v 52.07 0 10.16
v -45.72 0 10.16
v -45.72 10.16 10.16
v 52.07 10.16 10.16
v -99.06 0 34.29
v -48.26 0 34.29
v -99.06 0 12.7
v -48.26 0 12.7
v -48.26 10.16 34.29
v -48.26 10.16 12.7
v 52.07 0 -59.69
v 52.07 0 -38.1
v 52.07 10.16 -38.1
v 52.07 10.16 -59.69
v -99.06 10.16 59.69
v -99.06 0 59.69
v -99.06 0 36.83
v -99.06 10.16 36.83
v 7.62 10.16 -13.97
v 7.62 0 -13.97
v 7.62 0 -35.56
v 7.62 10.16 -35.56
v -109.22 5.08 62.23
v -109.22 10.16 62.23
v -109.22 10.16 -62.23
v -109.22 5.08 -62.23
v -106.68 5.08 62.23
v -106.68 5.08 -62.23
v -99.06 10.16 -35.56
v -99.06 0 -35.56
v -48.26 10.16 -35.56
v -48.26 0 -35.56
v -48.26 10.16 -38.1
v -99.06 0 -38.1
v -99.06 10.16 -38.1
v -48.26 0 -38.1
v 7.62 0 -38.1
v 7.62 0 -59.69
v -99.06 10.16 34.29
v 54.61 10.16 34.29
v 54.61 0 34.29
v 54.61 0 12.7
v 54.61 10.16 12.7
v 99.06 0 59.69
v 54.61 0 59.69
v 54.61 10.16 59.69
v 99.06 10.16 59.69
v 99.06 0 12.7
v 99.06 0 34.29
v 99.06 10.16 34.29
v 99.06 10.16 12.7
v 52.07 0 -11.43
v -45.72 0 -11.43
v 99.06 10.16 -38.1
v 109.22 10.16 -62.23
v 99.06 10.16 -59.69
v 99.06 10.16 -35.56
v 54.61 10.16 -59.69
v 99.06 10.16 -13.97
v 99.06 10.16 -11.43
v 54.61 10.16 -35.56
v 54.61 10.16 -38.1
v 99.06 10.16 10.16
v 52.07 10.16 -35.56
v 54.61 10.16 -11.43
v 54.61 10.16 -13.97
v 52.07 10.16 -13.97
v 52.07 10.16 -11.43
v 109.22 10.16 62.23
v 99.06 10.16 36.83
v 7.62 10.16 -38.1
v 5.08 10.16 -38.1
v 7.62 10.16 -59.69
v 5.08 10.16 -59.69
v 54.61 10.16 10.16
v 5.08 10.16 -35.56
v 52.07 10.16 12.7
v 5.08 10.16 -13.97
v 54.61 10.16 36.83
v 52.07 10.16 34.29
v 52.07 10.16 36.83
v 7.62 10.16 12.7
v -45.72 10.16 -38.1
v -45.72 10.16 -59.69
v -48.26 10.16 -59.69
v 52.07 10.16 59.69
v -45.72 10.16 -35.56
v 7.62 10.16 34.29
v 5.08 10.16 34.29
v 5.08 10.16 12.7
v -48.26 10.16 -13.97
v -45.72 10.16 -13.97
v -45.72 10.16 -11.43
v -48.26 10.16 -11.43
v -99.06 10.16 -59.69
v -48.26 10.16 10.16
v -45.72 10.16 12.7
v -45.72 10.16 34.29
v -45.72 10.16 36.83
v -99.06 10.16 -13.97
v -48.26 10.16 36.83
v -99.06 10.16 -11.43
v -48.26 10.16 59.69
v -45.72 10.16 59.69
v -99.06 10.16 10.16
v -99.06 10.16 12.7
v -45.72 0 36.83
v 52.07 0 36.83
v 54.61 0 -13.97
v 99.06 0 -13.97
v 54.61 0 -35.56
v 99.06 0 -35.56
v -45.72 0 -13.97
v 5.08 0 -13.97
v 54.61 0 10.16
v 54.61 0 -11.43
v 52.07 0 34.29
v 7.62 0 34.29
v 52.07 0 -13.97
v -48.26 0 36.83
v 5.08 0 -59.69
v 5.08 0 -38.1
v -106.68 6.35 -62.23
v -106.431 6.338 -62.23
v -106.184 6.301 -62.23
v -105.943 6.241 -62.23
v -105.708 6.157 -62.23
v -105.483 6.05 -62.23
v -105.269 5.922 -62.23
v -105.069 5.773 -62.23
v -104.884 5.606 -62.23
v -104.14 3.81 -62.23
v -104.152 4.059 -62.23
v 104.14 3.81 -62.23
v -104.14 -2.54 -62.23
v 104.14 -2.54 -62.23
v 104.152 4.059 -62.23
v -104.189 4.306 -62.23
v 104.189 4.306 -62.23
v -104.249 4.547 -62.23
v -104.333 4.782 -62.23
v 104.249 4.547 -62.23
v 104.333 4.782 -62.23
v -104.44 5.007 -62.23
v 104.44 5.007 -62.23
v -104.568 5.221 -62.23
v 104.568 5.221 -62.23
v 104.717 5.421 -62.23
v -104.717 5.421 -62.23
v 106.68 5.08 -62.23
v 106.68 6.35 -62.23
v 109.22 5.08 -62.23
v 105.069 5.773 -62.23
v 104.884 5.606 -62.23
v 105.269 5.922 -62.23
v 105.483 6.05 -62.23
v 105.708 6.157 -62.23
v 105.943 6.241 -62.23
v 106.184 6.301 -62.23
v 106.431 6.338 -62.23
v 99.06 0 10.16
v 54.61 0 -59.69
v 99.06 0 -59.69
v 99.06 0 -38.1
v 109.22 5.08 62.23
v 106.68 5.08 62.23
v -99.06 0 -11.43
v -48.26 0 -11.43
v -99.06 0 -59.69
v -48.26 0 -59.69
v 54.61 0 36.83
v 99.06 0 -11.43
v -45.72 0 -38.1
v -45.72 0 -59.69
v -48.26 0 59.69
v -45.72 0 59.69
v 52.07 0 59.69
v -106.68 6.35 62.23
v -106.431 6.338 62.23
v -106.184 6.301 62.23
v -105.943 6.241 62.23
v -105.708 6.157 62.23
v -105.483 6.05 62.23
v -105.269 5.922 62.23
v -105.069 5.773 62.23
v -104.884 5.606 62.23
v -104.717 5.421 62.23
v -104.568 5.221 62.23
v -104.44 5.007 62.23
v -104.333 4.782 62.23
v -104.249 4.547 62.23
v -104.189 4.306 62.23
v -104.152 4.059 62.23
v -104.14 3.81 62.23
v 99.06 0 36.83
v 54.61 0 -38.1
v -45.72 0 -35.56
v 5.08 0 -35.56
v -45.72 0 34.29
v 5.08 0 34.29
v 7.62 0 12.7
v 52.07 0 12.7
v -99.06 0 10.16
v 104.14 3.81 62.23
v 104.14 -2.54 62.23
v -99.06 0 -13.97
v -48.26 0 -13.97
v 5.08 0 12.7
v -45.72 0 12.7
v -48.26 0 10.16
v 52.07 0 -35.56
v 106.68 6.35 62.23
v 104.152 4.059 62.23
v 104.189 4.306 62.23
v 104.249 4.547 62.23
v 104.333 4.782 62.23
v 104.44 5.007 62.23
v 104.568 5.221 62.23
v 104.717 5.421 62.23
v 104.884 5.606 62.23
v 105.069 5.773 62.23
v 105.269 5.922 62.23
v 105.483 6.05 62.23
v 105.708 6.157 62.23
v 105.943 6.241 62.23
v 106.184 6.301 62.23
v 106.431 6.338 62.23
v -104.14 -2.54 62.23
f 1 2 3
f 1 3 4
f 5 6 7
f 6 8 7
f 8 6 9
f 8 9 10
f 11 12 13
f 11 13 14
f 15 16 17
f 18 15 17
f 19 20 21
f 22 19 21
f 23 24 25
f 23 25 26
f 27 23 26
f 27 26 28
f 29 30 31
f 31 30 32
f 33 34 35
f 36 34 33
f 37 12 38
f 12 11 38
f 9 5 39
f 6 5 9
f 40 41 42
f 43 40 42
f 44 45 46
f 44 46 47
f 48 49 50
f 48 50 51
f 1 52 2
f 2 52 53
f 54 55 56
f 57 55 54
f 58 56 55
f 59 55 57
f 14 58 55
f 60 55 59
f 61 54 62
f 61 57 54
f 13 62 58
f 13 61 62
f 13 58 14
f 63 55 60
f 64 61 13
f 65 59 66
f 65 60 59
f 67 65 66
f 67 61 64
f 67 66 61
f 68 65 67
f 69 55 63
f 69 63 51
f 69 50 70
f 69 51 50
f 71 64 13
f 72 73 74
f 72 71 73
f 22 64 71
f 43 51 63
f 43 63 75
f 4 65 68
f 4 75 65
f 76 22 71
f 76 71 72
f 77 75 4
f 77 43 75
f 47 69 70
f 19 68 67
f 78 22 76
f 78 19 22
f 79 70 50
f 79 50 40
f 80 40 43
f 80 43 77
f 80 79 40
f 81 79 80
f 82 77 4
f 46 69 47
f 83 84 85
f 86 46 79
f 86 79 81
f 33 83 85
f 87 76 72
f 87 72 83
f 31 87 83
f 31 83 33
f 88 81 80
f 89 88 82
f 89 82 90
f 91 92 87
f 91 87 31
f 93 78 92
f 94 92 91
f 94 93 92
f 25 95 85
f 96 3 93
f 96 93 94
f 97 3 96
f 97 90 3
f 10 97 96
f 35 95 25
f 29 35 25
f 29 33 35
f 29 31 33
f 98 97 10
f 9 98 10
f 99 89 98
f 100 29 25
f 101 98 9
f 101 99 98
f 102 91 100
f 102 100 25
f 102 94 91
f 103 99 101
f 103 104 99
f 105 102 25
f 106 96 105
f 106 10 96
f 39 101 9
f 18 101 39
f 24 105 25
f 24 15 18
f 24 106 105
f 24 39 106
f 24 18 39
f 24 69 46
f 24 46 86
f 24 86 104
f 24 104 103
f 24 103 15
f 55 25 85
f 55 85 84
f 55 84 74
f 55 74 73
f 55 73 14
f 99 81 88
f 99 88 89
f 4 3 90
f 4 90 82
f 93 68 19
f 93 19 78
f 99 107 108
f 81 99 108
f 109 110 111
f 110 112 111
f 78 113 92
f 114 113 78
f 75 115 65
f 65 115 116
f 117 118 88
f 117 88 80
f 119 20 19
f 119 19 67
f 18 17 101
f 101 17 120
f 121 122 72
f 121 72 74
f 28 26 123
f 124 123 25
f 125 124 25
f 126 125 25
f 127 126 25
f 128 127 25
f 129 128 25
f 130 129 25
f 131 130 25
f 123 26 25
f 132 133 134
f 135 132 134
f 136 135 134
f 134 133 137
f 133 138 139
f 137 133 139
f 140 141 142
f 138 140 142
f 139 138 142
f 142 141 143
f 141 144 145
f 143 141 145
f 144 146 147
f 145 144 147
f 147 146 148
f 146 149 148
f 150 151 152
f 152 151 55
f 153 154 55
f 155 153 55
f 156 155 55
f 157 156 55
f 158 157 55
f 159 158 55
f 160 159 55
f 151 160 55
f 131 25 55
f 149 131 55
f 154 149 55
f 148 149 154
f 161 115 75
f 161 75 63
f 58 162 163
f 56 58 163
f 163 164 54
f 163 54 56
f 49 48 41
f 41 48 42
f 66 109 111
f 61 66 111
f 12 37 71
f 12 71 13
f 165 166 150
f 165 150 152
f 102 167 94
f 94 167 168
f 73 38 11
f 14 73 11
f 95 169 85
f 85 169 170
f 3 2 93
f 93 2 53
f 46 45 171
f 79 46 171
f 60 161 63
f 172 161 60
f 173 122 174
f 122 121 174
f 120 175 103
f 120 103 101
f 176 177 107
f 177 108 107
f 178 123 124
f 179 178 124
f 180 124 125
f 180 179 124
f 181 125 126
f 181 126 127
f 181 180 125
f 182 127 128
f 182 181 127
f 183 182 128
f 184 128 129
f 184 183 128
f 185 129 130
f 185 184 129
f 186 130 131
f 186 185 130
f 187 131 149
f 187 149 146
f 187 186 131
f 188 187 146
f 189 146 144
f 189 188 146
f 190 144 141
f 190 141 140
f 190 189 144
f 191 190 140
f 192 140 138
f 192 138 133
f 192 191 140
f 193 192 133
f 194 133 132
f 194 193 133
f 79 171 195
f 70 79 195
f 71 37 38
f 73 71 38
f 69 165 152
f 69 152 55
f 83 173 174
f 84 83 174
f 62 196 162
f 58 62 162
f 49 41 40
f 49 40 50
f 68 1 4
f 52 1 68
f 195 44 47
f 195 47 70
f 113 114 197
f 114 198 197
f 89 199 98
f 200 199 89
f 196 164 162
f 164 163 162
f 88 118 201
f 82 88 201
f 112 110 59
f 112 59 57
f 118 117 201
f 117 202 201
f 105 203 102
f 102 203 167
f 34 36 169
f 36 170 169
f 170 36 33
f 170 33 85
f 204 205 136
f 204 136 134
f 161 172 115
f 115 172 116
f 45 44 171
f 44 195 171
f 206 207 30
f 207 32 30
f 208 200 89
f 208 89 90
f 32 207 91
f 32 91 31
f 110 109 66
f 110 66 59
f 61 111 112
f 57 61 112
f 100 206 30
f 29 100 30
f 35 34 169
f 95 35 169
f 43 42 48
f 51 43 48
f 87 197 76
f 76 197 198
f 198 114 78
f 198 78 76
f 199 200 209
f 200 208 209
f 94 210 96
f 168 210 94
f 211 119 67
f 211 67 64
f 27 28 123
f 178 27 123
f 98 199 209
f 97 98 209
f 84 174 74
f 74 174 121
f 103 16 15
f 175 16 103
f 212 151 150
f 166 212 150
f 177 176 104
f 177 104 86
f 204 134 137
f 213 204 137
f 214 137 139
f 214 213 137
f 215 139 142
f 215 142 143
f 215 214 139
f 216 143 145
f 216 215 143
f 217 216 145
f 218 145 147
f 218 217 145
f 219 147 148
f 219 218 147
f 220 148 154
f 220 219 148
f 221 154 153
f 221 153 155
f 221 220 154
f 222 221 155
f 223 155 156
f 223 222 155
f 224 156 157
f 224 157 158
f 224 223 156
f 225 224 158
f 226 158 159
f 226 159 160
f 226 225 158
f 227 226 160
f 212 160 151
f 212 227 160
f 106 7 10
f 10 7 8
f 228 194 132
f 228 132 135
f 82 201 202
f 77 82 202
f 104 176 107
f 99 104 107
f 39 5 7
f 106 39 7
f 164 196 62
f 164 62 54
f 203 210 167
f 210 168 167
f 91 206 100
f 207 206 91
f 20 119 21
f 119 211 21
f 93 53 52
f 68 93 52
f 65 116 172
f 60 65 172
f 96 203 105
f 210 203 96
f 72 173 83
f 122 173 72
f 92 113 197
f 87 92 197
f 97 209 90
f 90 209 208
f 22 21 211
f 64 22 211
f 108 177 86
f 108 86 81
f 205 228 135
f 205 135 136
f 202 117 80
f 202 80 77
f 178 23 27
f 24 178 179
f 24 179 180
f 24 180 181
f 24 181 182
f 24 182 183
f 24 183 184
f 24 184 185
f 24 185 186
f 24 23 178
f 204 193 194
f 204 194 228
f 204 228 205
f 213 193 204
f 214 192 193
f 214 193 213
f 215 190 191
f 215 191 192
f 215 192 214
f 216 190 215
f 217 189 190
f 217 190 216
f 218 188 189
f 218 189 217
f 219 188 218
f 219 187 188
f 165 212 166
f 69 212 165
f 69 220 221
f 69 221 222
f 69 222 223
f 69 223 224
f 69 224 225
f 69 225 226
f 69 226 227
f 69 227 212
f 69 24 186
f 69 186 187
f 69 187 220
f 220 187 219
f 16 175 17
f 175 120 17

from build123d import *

# Parameters (mm, degrees)
SKETCH1_W    = 203.2
SKETCH1_H    = 124.46
SKETCH1_W_2  = 44.45
SKETCH1_H_2  = 22.86
SKETCH1_H_3  = 21.59
SKETCH1_W_3  = 50.8
SKETCH1_W_4  = 97.79
TRAY_DEPTH   = 10.16
SKETCH3_W    = 203.2
SKETCH3_H    = 124.46
BASE_DEPTH   = 2.54
HANDLE_DEPTH = 124.46


with BuildPart() as part:
    # Sketch1 → tray (new body)
    with BuildSketch(Plane(origin=(0, 0, 0), x_dir=(1, 0, 0), z_dir=(0, 1, 0))):
        Rectangle(SKETCH1_W, SKETCH1_H)
        with Locations((76.835, -48.26)):
            Rectangle(SKETCH1_W_2, SKETCH1_H_2, mode=Mode.SUBTRACT)
        with Locations((76.835, 48.895)):
            Rectangle(SKETCH1_W_2, SKETCH1_H_3, mode=Mode.SUBTRACT)
        with Locations((-73.66, -48.26)):
            Rectangle(SKETCH1_W_3, SKETCH1_H_2, mode=Mode.SUBTRACT)
        with Locations((-73.66, 48.895)):
            Rectangle(SKETCH1_W_3, SKETCH1_H_3, mode=Mode.SUBTRACT)
        with Locations((-73.66, 24.765)):
            Rectangle(SKETCH1_W_3, SKETCH1_H_3, mode=Mode.SUBTRACT)
        with Locations((-73.66, 0.635)):
            Rectangle(SKETCH1_W_3, SKETCH1_H_3, mode=Mode.SUBTRACT)
        with Locations((-73.66, -23.495)):
            Rectangle(SKETCH1_W_3, SKETCH1_H_3, mode=Mode.SUBTRACT)
        with Locations((-20.32, 48.895)):
            Rectangle(SKETCH1_W_3, SKETCH1_H_3, mode=Mode.SUBTRACT)
        with Locations((29.845, 48.895)):
            Rectangle(SKETCH1_W_2, SKETCH1_H_3, mode=Mode.SUBTRACT)
        with Locations((-20.32, -23.495)):
            Rectangle(SKETCH1_W_3, SKETCH1_H_3, mode=Mode.SUBTRACT)
        with Locations((29.845, -23.495)):
            Rectangle(SKETCH1_W_2, SKETCH1_H_3, mode=Mode.SUBTRACT)
        with Locations((29.845, 24.765)):
            Rectangle(SKETCH1_W_2, SKETCH1_H_3, mode=Mode.SUBTRACT)
        with Locations((-20.32, 24.765)):
            Rectangle(SKETCH1_W_3, SKETCH1_H_3, mode=Mode.SUBTRACT)
        with Locations((3.175, 0.635)):
            Rectangle(SKETCH1_W_4, SKETCH1_H_3, mode=Mode.SUBTRACT)
        with Locations((3.175, -48.26)):
            Rectangle(SKETCH1_W_4, SKETCH1_H_2, mode=Mode.SUBTRACT)
        with Locations((76.835, -23.495)):
            Rectangle(SKETCH1_W_2, SKETCH1_H_3, mode=Mode.SUBTRACT)
        with Locations((76.835, 0.635)):
            Rectangle(SKETCH1_W_2, SKETCH1_H_3, mode=Mode.SUBTRACT)
        with Locations((76.835, 24.765)):
            Rectangle(SKETCH1_W_2, SKETCH1_H_3, mode=Mode.SUBTRACT)
    extrude(amount=TRAY_DEPTH)

    # Sketch3 → base (add)
    with BuildSketch(Plane(origin=(0, 0, 0), x_dir=(-1, 0, 0), z_dir=(0, -1, 0))):
        Rectangle(SKETCH3_W, SKETCH3_H)
    extrude(amount=BASE_DEPTH)

    # Sketch4 → handle (add)
    with BuildSketch(Plane.XY.offset(62.23)):
        with BuildLine():
            Line((-101.6, -2.54), (-101.6, 10.16))
            Line((-101.6, 10.16), (-109.22, 10.16))
            Line((-109.22, 10.16), (-109.22, 5.08))
            Line((-109.22, 5.08), (-106.68, 5.08))
            Line((-106.68, 5.08), (-106.68, 6.35))
            ThreePointArc((-106.68, 6.35), (-104.883948776, 5.606051224), (-104.14, 3.81))
            Line((-104.14, 3.81), (-104.14, -2.54))
            Line((-104.14, -2.54), (-101.6, -2.54))
        make_face()
        with BuildLine():
            Line((101.6, -2.54), (104.14, -2.54))
            Line((104.14, -2.54), (104.14, 3.81))
            ThreePointArc((104.14, 3.81), (104.883948776, 5.606051224), (106.68, 6.35))
            Line((106.68, 6.35), (106.68, 5.08))
            Line((106.68, 5.08), (109.22, 5.08))
            Line((109.22, 5.08), (109.22, 10.16))
            Line((109.22, 10.16), (101.6, 10.16))
            Line((101.6, 10.16), (101.6, -2.54))
        make_face()
    extrude(amount=-HANDLE_DEPTH)


solid = part.part
